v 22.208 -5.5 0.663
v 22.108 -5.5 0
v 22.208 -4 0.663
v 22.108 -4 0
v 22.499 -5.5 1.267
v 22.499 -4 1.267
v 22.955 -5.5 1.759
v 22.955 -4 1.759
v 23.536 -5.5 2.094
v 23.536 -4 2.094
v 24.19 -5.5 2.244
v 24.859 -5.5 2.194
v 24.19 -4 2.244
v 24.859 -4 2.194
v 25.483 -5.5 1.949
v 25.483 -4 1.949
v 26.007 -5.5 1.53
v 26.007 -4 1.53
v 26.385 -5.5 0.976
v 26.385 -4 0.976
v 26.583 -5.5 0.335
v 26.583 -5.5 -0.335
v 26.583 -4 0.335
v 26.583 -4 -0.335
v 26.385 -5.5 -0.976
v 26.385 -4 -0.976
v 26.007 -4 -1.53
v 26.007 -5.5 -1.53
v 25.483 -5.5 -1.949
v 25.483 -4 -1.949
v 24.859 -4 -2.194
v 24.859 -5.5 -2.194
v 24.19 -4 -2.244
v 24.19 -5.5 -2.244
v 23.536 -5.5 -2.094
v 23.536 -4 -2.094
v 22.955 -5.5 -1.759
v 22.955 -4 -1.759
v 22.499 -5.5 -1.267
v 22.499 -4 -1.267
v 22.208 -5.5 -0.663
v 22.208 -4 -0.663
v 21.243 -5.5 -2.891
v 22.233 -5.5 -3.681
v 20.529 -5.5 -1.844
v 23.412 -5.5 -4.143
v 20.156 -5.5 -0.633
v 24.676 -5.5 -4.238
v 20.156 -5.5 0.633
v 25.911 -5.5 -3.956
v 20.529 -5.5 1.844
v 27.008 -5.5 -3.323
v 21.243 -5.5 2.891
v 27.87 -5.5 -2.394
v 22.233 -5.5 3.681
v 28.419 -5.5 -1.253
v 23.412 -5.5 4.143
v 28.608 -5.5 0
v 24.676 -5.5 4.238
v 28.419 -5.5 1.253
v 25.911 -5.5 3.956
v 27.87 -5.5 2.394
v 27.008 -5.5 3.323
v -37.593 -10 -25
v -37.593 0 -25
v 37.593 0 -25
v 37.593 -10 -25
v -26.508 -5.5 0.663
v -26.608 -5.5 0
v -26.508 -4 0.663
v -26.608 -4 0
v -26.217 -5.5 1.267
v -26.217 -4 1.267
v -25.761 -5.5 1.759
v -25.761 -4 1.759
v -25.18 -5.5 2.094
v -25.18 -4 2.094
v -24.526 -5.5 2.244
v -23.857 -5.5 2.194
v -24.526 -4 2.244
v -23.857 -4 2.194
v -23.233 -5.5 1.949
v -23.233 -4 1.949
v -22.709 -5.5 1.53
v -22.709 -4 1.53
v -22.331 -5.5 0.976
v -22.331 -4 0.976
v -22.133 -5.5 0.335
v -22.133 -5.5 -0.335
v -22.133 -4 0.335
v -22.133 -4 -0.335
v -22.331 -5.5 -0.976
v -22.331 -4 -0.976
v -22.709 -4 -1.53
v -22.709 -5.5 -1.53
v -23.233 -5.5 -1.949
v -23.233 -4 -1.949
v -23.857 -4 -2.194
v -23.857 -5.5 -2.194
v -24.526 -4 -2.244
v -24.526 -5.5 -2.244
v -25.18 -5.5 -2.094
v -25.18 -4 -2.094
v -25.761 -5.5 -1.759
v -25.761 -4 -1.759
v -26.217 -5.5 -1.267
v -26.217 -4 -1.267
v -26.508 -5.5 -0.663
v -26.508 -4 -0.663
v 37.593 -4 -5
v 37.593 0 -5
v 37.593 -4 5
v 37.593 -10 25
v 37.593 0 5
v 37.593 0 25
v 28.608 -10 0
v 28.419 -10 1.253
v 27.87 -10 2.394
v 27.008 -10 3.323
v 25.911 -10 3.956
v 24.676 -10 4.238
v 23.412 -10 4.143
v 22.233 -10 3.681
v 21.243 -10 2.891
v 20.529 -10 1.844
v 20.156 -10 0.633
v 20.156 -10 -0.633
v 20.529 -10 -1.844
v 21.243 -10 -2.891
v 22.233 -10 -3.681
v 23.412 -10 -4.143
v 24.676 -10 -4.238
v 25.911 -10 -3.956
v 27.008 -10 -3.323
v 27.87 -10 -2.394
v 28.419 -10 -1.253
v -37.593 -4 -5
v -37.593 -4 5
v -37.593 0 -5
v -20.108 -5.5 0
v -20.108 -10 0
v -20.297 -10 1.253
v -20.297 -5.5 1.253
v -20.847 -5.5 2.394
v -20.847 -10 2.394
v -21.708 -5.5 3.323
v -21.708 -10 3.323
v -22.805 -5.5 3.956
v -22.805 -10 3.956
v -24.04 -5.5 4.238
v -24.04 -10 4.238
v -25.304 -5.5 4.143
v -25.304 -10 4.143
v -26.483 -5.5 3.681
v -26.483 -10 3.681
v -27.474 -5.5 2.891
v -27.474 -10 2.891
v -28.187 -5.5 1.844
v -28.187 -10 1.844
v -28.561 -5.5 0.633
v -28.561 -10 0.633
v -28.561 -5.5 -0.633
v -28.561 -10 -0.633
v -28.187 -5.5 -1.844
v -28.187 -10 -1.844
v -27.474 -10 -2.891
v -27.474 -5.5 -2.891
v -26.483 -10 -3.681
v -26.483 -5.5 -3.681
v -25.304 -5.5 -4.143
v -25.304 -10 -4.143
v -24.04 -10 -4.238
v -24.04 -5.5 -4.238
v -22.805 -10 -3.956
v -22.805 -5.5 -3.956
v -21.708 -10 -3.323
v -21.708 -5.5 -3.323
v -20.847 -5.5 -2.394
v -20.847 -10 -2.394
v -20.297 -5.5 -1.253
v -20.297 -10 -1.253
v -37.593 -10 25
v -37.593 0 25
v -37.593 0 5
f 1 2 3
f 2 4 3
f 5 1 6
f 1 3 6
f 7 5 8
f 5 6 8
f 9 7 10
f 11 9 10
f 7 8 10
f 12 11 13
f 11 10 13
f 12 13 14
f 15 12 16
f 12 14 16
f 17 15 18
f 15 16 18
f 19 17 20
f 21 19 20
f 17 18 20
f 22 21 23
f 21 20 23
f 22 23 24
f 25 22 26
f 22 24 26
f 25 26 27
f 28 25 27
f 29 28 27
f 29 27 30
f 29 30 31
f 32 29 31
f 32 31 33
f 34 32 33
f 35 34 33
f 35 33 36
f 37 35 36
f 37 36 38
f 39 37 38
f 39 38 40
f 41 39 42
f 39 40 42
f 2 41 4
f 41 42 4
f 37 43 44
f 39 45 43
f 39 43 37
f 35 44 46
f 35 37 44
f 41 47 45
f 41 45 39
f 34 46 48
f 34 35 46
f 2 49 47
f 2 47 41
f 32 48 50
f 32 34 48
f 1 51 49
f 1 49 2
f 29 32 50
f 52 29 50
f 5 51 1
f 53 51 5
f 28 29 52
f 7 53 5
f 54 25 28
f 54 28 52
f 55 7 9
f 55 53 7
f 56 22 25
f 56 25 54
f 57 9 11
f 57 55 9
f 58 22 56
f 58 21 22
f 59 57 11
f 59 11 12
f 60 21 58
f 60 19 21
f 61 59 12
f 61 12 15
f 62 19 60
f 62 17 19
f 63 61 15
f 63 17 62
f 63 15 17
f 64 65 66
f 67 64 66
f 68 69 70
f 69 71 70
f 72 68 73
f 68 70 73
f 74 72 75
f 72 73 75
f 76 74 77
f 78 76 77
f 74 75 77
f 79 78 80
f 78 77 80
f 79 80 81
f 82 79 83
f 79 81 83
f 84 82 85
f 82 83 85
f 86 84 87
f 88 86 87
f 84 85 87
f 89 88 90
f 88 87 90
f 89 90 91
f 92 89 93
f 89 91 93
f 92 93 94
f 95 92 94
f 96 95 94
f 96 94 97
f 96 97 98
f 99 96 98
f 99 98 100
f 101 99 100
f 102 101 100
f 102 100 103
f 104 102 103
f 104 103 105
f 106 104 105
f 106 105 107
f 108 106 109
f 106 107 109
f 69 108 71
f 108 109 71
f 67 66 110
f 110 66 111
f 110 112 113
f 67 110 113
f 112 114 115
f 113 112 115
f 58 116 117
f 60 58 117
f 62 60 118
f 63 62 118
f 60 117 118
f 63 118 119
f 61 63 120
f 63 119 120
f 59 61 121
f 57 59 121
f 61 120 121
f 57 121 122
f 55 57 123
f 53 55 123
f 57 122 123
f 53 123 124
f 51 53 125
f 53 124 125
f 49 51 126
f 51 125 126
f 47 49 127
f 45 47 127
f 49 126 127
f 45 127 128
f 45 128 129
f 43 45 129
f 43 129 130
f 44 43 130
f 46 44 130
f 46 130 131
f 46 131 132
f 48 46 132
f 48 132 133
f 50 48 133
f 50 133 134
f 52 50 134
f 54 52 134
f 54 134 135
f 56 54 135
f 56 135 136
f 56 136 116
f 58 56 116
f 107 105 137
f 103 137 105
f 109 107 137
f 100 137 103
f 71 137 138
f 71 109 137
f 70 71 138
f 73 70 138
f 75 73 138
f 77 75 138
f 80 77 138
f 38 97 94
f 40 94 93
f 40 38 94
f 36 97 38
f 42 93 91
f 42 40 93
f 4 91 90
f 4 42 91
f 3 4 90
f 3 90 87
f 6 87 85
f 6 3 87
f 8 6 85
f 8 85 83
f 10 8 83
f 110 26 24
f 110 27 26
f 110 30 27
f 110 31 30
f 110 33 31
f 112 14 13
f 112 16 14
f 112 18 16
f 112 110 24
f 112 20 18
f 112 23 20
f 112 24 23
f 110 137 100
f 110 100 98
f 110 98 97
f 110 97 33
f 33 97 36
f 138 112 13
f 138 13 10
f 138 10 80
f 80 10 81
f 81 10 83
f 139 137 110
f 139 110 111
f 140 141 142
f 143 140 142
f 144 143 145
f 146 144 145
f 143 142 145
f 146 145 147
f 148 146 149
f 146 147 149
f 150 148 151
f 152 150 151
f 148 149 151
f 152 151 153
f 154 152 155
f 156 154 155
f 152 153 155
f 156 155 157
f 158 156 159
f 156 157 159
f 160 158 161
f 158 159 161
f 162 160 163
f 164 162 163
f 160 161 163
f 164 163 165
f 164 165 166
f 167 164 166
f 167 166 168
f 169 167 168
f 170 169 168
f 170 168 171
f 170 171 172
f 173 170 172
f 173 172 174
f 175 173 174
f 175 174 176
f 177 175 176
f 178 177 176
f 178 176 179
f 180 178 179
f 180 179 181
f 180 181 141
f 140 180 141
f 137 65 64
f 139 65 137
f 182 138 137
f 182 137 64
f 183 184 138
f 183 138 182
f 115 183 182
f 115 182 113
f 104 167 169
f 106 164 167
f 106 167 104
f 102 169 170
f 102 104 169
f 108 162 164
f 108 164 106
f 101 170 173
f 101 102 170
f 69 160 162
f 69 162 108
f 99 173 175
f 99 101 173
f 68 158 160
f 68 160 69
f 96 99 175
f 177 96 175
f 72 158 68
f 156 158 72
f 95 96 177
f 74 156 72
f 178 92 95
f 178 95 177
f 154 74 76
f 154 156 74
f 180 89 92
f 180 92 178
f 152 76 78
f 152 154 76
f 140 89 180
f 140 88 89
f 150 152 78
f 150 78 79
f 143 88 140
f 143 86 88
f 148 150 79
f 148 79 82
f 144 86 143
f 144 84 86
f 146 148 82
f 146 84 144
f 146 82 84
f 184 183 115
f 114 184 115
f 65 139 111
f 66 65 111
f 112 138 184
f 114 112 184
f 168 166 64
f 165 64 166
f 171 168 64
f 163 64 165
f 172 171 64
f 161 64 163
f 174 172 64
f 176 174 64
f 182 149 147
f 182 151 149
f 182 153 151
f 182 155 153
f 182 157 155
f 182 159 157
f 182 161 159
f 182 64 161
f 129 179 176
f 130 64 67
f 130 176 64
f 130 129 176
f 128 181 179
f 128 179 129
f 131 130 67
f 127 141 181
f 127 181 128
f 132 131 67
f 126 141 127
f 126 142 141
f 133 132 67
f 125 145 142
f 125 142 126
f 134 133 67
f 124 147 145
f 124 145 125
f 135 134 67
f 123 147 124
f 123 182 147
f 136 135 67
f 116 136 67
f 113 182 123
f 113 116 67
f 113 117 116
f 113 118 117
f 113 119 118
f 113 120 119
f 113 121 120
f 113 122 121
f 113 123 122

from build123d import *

# Parameters (mm, degrees)
F0_W           = 75.186654
F0_H           = 50
F1_DEPTH       = 10
F2_W           = 4
F2_H           = 10
F3_DEPTH       = 75.187655
F5_D           = 4.5
F5_CBORE_D     = 8.5
F5_CBORE_DEPTH = 4.5


with BuildPart() as f1:
    # F0 (on Front) → F1 (new body)
    with BuildSketch(Plane.XZ):
        Rectangle(F0_W, F0_H)
    extrude(amount=F1_DEPTH)

    # F2 (on face) → F3 (cut, through all)
    with BuildSketch(Plane.YZ.offset(37.593327)):
        with Locations((-2, 0)):
            Rectangle(F2_W, F2_H)
    extrude(amount=-F3_DEPTH, mode=Mode.SUBTRACT)

    # F5 (through all)
    with Locations(Plane.XZ.offset(10)):
        with Locations((-24.358043, 0), (24.358043, 0)):
            CounterBoreHole(F5_D / 2, F5_CBORE_D / 2, F5_CBORE_DEPTH)


solid = f1.part
